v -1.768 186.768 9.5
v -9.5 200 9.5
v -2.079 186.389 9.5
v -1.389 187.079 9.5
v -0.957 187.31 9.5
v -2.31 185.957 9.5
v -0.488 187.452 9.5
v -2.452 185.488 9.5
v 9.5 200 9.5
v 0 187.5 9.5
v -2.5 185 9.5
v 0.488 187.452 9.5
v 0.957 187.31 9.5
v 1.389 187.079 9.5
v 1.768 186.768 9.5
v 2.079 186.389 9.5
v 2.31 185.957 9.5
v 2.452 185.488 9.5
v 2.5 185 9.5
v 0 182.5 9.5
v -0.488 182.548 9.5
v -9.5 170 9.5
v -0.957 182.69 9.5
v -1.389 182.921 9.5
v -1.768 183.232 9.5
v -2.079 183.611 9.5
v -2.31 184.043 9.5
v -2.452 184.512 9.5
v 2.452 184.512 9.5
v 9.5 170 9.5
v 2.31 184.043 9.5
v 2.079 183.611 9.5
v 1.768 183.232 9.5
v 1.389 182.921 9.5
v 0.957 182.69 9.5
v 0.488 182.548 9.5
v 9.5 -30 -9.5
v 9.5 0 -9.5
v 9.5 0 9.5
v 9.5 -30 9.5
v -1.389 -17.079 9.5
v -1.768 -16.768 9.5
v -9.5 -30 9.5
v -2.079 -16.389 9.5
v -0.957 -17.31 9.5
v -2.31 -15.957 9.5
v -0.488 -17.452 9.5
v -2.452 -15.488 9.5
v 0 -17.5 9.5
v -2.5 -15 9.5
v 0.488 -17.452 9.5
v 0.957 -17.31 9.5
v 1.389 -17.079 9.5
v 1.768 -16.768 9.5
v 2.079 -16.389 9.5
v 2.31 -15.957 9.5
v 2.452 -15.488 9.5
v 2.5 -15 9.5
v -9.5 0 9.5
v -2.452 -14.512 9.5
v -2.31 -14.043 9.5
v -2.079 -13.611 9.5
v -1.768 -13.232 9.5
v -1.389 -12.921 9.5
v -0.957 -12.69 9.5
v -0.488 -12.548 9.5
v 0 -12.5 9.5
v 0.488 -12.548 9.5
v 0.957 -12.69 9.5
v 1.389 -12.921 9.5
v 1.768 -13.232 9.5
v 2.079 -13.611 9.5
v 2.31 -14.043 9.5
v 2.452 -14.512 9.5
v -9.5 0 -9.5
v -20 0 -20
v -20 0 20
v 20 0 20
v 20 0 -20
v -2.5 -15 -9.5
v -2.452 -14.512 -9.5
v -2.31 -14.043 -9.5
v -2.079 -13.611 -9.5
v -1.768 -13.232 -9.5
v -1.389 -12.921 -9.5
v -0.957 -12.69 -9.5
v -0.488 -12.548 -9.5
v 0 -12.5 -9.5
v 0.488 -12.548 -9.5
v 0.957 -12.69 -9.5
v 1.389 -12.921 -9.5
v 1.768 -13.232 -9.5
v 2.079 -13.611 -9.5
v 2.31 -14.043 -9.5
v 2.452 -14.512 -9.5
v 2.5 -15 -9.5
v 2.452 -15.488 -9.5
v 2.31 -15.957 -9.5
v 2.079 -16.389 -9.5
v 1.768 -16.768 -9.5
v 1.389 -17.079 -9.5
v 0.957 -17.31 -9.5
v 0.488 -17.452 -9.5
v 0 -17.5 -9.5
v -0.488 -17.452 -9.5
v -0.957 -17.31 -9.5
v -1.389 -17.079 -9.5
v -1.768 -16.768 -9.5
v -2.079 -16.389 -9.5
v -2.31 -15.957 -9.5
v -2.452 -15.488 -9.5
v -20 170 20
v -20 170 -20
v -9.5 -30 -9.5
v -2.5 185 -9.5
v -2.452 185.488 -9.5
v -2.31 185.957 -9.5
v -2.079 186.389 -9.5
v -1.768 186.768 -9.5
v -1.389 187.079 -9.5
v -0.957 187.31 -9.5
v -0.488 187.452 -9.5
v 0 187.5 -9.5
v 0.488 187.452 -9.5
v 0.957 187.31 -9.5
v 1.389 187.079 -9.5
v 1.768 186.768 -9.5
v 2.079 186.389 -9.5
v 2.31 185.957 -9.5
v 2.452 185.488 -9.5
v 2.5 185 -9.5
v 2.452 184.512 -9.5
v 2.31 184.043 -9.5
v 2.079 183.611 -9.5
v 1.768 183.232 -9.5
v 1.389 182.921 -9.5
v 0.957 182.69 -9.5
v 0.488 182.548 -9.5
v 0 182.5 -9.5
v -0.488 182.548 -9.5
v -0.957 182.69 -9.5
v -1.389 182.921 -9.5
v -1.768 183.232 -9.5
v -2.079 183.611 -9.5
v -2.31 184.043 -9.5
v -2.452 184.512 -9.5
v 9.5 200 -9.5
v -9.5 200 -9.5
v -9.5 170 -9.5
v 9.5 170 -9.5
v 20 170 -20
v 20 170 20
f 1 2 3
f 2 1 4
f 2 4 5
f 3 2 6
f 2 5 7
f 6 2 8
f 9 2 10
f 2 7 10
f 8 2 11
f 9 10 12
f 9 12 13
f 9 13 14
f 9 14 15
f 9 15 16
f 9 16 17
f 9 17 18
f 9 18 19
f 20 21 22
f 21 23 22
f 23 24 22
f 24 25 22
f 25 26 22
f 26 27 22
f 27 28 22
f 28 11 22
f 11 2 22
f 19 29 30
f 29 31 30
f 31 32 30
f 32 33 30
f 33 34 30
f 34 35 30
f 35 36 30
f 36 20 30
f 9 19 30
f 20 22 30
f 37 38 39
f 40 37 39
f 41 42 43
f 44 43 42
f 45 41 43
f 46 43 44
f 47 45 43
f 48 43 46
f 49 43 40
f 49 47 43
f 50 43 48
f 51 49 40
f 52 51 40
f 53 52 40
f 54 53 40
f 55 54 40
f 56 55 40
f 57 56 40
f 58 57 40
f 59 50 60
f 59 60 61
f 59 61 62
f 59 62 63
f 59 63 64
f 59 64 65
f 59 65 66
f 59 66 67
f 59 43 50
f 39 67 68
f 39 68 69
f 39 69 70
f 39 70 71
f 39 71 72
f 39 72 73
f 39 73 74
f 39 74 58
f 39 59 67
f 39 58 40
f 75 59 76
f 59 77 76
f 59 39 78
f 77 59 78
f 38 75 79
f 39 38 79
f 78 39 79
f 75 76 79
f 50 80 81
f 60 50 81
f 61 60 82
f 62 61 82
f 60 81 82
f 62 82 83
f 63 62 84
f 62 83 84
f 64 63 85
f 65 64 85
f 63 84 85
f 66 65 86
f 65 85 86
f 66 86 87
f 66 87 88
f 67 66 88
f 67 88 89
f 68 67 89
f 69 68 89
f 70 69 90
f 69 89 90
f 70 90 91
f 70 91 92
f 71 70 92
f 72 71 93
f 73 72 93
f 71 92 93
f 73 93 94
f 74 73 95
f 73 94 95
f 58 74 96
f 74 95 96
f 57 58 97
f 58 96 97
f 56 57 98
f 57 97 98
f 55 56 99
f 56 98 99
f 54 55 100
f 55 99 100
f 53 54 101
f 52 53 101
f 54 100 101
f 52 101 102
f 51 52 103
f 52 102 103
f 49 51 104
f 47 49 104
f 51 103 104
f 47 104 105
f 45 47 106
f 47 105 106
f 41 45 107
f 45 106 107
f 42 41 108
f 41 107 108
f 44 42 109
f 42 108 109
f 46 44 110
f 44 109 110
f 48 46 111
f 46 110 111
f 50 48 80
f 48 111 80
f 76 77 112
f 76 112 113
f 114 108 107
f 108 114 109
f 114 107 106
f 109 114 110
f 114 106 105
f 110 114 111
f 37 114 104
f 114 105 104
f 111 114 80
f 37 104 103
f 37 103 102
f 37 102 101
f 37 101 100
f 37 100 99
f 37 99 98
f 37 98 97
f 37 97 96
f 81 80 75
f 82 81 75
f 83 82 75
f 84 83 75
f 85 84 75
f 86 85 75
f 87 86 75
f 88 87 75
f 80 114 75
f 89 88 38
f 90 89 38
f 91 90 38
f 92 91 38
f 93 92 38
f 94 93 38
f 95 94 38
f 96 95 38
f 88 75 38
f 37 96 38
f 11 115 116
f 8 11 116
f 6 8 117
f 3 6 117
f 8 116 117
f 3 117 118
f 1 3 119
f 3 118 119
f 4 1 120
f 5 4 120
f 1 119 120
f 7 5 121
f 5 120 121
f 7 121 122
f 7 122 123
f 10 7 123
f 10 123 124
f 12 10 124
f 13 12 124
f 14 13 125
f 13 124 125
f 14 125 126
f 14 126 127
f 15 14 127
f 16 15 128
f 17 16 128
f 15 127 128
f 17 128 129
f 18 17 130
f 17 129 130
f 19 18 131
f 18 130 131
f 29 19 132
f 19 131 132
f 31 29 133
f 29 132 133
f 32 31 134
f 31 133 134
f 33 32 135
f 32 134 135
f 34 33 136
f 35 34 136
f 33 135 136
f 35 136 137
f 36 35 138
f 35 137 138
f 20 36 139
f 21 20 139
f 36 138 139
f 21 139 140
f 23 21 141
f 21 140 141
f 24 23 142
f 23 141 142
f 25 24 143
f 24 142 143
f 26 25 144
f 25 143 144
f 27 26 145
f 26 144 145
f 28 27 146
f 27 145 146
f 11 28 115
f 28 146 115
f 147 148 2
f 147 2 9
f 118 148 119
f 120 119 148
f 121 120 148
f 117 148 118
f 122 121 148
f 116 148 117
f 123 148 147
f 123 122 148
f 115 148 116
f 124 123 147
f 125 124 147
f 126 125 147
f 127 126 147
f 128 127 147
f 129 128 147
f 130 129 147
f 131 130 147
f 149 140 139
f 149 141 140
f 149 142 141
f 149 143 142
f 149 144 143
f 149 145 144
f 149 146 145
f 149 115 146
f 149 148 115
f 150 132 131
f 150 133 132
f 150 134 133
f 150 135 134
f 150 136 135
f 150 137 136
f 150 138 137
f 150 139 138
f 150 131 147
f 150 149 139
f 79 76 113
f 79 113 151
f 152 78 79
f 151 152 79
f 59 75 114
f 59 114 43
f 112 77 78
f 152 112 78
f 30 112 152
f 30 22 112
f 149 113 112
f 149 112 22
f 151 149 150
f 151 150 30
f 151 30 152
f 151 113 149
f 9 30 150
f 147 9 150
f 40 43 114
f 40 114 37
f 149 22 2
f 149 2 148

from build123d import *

# Parameters (mm, degrees)
SKETCH1_W           = 40
SKETCH1_H           = 40
BOSS_EXTRUDE1_DEPTH = 170
SKETCH2_W           = 19
SKETCH2_H           = 19
BOSS_EXTRUDE3_DEPTH = 30
SKETCH3_W           = 19
SKETCH3_H           = 19
BOSS_EXTRUDE4_DEPTH = 30
SKETCH4_R           = 2.5
CUT_EXTRUDE1_DEPTH  = 19


with BuildPart() as part:
    # Sketch1 → Boss-Extrude1 (new body)
    with BuildSketch(Plane(origin=(0, 0, 0), x_dir=(1, 0, 0), z_dir=(0, 1, 0))):
        Rectangle(SKETCH1_W, SKETCH1_H)
    extrude(amount=BOSS_EXTRUDE1_DEPTH)

    # Sketch2 → Boss-Extrude3 (add)
    with BuildSketch(Plane(origin=(0, 170, 0), x_dir=(1, 0, 0), z_dir=(0, 1, 0))):
        Rectangle(SKETCH2_W, SKETCH2_H)
    extrude(amount=BOSS_EXTRUDE3_DEPTH)

    # Sketch3 → Boss-Extrude4 (add)
    with BuildSketch(Plane.XZ):
        Rectangle(SKETCH3_W, SKETCH3_H)
    extrude(amount=BOSS_EXTRUDE4_DEPTH)

    # Sketch4 → Cut-Extrude1 (cut)
    with BuildSketch(Plane(origin=(0, 0, -9.5), x_dir=(-1, 0, 0), z_dir=(0, 0, -1))):
        with Locations((0, -15)):
            Circle(SKETCH4_R)
        with Locations((0, 185)):
            Circle(SKETCH4_R)
    extrude(amount=-CUT_EXTRUDE1_DEPTH, mode=Mode.SUBTRACT)


solid = part.part
